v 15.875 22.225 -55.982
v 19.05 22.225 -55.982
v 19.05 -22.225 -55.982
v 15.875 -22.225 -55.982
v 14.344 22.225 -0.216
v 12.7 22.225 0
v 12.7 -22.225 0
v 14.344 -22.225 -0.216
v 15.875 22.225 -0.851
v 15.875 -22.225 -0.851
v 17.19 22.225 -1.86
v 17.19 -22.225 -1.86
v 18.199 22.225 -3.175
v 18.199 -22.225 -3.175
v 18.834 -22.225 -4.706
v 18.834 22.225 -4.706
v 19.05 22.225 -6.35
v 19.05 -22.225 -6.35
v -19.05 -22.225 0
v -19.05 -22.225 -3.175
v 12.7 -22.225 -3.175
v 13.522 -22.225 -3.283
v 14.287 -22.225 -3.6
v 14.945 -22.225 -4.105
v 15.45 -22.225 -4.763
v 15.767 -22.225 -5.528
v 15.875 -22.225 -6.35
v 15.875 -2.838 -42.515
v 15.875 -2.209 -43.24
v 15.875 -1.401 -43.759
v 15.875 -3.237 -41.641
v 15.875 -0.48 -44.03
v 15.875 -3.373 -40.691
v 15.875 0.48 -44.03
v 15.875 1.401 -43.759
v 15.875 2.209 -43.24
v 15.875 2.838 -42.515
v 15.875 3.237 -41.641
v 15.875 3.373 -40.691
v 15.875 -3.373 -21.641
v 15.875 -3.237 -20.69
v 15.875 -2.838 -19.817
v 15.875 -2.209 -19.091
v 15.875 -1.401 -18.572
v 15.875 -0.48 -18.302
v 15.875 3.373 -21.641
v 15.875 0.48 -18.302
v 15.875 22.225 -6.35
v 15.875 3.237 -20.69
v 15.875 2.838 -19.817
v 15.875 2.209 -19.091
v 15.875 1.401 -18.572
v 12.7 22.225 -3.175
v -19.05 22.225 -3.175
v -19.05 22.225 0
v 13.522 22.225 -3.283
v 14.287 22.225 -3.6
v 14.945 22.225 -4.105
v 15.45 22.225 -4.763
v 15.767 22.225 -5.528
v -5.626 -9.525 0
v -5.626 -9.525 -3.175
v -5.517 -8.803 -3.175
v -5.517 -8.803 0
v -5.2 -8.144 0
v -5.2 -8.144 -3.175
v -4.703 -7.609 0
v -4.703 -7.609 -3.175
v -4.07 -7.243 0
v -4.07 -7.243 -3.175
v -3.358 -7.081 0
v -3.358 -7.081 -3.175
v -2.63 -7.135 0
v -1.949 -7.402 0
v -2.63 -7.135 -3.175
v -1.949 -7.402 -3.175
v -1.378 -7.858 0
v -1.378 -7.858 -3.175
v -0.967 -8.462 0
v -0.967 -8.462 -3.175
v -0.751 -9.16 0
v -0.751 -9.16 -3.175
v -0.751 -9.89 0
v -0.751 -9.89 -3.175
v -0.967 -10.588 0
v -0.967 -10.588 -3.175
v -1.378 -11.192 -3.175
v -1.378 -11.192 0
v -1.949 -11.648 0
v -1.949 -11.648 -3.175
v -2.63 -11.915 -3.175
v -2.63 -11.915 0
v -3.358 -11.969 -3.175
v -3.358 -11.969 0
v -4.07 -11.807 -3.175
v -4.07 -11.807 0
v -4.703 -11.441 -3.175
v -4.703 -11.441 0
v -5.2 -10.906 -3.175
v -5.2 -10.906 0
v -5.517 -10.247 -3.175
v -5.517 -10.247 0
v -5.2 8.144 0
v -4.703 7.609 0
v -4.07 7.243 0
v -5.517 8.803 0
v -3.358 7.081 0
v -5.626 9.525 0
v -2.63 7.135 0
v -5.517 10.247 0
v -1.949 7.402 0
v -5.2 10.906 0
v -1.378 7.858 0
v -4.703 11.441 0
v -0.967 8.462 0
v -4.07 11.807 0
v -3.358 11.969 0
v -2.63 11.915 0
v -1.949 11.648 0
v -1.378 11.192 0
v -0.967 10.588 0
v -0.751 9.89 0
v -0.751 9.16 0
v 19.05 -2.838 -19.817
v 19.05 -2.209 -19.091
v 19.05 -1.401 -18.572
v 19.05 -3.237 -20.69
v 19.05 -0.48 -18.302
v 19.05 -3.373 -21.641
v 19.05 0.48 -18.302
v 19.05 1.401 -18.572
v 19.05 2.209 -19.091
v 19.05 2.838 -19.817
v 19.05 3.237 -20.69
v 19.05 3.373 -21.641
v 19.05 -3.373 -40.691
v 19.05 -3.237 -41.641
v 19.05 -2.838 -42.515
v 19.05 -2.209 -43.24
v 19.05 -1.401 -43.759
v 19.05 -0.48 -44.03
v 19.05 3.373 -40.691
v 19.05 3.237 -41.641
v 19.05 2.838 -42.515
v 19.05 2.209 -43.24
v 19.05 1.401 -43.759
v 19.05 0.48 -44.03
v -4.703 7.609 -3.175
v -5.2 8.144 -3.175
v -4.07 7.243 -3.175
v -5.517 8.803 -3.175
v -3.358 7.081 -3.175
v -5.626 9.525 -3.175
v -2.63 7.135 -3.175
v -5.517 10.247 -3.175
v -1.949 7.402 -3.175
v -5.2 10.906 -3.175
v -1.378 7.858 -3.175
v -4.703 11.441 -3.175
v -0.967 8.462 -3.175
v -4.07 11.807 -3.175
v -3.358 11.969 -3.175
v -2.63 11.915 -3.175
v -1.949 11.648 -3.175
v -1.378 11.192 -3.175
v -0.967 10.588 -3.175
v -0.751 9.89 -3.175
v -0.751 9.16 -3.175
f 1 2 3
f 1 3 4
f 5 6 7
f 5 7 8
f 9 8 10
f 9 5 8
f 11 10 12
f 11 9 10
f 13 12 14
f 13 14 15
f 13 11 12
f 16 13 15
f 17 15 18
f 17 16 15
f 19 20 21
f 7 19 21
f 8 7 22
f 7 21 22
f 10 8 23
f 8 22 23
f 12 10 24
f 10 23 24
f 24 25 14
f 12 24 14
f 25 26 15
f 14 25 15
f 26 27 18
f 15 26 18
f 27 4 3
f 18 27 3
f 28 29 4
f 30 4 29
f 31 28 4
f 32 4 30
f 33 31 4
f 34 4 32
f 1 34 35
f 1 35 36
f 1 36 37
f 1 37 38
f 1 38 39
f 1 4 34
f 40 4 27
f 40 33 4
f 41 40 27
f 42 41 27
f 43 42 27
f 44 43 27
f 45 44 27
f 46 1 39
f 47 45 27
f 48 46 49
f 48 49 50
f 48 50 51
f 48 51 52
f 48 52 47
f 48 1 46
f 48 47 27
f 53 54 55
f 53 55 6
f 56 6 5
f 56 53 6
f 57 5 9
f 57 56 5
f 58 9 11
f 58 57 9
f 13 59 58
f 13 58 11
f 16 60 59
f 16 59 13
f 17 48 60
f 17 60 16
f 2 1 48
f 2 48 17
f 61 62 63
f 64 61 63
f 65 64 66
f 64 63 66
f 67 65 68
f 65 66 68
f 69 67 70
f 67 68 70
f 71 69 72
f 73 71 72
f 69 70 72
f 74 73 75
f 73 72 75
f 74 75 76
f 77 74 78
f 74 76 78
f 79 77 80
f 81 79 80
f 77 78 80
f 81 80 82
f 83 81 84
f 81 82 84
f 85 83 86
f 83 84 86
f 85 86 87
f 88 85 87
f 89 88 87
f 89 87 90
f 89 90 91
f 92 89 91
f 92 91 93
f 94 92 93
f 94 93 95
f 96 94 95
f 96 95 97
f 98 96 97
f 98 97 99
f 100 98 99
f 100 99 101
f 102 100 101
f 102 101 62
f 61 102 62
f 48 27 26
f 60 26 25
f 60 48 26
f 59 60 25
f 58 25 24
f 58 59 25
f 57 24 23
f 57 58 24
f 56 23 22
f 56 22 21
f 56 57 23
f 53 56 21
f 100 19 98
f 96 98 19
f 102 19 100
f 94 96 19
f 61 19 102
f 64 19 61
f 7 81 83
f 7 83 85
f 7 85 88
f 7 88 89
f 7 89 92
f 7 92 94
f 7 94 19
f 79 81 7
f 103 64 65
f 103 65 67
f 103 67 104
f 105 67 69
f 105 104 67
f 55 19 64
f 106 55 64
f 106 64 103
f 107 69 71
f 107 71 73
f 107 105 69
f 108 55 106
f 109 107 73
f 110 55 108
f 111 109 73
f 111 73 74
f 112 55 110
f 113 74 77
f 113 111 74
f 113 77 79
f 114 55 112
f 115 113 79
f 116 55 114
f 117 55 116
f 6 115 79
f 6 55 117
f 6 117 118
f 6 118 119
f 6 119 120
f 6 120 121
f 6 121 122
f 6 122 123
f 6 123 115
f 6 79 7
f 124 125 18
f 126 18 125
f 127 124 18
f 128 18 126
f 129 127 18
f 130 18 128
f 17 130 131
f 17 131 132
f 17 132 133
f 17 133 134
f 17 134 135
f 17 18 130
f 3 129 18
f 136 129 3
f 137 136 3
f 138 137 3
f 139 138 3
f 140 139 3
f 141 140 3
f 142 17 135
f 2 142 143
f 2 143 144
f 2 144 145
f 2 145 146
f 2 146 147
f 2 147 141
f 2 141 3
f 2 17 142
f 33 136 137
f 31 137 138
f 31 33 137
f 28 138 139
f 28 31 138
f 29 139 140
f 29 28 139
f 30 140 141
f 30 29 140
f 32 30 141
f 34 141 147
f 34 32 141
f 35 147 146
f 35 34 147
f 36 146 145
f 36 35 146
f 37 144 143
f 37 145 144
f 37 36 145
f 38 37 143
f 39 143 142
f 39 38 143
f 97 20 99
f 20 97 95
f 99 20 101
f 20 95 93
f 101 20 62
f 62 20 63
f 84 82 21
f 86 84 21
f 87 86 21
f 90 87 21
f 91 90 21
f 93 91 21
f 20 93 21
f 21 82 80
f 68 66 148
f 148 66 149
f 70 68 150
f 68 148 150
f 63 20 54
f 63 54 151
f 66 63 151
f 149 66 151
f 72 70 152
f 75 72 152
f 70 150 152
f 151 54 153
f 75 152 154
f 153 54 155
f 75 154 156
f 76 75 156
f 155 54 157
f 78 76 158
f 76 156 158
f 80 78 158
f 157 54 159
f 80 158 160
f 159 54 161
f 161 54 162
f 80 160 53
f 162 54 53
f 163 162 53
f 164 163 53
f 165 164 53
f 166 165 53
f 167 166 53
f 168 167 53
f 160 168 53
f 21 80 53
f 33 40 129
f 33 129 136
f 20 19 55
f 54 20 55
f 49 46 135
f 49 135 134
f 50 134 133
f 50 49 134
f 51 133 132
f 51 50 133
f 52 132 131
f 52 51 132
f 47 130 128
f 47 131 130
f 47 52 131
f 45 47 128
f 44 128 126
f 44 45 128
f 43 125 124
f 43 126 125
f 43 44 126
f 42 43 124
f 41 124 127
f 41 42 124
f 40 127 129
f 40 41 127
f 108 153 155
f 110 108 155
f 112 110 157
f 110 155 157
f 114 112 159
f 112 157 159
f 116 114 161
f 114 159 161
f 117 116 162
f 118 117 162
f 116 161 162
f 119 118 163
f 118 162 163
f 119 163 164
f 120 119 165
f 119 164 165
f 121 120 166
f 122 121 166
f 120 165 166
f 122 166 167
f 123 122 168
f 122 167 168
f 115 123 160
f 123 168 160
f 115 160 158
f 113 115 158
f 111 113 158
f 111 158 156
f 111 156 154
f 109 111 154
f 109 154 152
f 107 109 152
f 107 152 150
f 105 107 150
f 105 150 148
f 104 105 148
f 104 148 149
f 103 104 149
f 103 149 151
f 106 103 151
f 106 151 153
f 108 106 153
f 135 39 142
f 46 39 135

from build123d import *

# Parameters (mm, degrees)
SKETCH1_W                    = 38.1
SKETCH1_H                    = 44.45
BASE_FLANGE1_DEPTH           = 3.175
EDGE_FLANGE1_STRIP_W         = 19.05
EDGE_FLANGE1_STRIP_H         = 3.175
EDGE_FLANGE1_STRIP_CUT_DEPTH = 44.45
EDGE_FLANGE1_DEPTH           = 44.45
SKETCH9_R                    = 2.4511
CUT_EXTRUDE1_DEPTH           = 61.377066247
CUT_EXTRUDE3_DEPTH           = 70.625037081


# Sheet-metal steps are written as plain solids
with BuildPart() as part:
    # Sketch1 → Base-Flange1 (new body)
    with BuildSketch(Plane.XY):
        Rectangle(SKETCH1_W, SKETCH1_H)
    extrude(amount=-BASE_FLANGE1_DEPTH)

    # Edge-Flange1 strip (across the edge) → Edge-Flange1 strip cut (cut)
    with BuildSketch(Plane(origin=(19.05, 22.225, -3.175), x_dir=(-1, 0, 0), z_dir=(0, -1, 0))):
        with Locations((-3.175, -1.5875)):
            Rectangle(EDGE_FLANGE1_STRIP_W, EDGE_FLANGE1_STRIP_H)
    extrude(amount=EDGE_FLANGE1_STRIP_CUT_DEPTH, mode=Mode.SUBTRACT)

    # Edge-Flange1 section (across the edge) → Edge-Flange1 (add)
    with BuildSketch(Plane(origin=(19.05, 22.225, -3.175), x_dir=(-1, 0, 0), z_dir=(0, -1, 0))):
        with BuildLine():
            Line((0, 3.175), (0, 52.8066))
            Line((0, 52.8066), (3.175, 52.8066))
            Line((3.175, 52.8066), (3.175, 3.175))
            ThreePointArc((3.175, 3.175), (4.10493597, 0.92993597), (6.35, 0))
            Line((6.35, 0), (6.35, -3.175))
            ThreePointArc((6.35, -3.175), (1.859871939, -1.315128061), (0, 3.175))
        make_face()
    extrude(amount=EDGE_FLANGE1_DEPTH)

    # Sketch9 → Cut-Extrude1 (cut, through all)
    with BuildSketch(Plane(origin=(0, 0, -3.175), x_dir=(-1, 0, 0), z_dir=(0, 0, -1))):
        with Locations((3.175, 9.525)):
            Circle(SKETCH9_R)
        with Locations((3.175, -9.525)):
            Circle(SKETCH9_R)
    extrude(amount=-CUT_EXTRUDE1_DEPTH, mode=Mode.SUBTRACT)

    # Sketch12 → Cut-Extrude3 (cut, through all)
    with BuildSketch(Plane.ZY.offset(-15.875)):
        with BuildLine():
            Line((-40.6908, 3.3734375), (-21.6408, 3.3734375))
            ThreePointArc((-21.6408, 3.3734375), (-18.2673625, 0), (-21.6408, -3.3734375))
            Line((-21.6408, -3.3734375), (-40.6908, -3.3734375))
            ThreePointArc((-40.6908, -3.3734375), (-44.0642375, 0), (-40.6908, 3.3734375))
        make_face()
    extrude(amount=-CUT_EXTRUDE3_DEPTH, mode=Mode.SUBTRACT)


solid = part.part
